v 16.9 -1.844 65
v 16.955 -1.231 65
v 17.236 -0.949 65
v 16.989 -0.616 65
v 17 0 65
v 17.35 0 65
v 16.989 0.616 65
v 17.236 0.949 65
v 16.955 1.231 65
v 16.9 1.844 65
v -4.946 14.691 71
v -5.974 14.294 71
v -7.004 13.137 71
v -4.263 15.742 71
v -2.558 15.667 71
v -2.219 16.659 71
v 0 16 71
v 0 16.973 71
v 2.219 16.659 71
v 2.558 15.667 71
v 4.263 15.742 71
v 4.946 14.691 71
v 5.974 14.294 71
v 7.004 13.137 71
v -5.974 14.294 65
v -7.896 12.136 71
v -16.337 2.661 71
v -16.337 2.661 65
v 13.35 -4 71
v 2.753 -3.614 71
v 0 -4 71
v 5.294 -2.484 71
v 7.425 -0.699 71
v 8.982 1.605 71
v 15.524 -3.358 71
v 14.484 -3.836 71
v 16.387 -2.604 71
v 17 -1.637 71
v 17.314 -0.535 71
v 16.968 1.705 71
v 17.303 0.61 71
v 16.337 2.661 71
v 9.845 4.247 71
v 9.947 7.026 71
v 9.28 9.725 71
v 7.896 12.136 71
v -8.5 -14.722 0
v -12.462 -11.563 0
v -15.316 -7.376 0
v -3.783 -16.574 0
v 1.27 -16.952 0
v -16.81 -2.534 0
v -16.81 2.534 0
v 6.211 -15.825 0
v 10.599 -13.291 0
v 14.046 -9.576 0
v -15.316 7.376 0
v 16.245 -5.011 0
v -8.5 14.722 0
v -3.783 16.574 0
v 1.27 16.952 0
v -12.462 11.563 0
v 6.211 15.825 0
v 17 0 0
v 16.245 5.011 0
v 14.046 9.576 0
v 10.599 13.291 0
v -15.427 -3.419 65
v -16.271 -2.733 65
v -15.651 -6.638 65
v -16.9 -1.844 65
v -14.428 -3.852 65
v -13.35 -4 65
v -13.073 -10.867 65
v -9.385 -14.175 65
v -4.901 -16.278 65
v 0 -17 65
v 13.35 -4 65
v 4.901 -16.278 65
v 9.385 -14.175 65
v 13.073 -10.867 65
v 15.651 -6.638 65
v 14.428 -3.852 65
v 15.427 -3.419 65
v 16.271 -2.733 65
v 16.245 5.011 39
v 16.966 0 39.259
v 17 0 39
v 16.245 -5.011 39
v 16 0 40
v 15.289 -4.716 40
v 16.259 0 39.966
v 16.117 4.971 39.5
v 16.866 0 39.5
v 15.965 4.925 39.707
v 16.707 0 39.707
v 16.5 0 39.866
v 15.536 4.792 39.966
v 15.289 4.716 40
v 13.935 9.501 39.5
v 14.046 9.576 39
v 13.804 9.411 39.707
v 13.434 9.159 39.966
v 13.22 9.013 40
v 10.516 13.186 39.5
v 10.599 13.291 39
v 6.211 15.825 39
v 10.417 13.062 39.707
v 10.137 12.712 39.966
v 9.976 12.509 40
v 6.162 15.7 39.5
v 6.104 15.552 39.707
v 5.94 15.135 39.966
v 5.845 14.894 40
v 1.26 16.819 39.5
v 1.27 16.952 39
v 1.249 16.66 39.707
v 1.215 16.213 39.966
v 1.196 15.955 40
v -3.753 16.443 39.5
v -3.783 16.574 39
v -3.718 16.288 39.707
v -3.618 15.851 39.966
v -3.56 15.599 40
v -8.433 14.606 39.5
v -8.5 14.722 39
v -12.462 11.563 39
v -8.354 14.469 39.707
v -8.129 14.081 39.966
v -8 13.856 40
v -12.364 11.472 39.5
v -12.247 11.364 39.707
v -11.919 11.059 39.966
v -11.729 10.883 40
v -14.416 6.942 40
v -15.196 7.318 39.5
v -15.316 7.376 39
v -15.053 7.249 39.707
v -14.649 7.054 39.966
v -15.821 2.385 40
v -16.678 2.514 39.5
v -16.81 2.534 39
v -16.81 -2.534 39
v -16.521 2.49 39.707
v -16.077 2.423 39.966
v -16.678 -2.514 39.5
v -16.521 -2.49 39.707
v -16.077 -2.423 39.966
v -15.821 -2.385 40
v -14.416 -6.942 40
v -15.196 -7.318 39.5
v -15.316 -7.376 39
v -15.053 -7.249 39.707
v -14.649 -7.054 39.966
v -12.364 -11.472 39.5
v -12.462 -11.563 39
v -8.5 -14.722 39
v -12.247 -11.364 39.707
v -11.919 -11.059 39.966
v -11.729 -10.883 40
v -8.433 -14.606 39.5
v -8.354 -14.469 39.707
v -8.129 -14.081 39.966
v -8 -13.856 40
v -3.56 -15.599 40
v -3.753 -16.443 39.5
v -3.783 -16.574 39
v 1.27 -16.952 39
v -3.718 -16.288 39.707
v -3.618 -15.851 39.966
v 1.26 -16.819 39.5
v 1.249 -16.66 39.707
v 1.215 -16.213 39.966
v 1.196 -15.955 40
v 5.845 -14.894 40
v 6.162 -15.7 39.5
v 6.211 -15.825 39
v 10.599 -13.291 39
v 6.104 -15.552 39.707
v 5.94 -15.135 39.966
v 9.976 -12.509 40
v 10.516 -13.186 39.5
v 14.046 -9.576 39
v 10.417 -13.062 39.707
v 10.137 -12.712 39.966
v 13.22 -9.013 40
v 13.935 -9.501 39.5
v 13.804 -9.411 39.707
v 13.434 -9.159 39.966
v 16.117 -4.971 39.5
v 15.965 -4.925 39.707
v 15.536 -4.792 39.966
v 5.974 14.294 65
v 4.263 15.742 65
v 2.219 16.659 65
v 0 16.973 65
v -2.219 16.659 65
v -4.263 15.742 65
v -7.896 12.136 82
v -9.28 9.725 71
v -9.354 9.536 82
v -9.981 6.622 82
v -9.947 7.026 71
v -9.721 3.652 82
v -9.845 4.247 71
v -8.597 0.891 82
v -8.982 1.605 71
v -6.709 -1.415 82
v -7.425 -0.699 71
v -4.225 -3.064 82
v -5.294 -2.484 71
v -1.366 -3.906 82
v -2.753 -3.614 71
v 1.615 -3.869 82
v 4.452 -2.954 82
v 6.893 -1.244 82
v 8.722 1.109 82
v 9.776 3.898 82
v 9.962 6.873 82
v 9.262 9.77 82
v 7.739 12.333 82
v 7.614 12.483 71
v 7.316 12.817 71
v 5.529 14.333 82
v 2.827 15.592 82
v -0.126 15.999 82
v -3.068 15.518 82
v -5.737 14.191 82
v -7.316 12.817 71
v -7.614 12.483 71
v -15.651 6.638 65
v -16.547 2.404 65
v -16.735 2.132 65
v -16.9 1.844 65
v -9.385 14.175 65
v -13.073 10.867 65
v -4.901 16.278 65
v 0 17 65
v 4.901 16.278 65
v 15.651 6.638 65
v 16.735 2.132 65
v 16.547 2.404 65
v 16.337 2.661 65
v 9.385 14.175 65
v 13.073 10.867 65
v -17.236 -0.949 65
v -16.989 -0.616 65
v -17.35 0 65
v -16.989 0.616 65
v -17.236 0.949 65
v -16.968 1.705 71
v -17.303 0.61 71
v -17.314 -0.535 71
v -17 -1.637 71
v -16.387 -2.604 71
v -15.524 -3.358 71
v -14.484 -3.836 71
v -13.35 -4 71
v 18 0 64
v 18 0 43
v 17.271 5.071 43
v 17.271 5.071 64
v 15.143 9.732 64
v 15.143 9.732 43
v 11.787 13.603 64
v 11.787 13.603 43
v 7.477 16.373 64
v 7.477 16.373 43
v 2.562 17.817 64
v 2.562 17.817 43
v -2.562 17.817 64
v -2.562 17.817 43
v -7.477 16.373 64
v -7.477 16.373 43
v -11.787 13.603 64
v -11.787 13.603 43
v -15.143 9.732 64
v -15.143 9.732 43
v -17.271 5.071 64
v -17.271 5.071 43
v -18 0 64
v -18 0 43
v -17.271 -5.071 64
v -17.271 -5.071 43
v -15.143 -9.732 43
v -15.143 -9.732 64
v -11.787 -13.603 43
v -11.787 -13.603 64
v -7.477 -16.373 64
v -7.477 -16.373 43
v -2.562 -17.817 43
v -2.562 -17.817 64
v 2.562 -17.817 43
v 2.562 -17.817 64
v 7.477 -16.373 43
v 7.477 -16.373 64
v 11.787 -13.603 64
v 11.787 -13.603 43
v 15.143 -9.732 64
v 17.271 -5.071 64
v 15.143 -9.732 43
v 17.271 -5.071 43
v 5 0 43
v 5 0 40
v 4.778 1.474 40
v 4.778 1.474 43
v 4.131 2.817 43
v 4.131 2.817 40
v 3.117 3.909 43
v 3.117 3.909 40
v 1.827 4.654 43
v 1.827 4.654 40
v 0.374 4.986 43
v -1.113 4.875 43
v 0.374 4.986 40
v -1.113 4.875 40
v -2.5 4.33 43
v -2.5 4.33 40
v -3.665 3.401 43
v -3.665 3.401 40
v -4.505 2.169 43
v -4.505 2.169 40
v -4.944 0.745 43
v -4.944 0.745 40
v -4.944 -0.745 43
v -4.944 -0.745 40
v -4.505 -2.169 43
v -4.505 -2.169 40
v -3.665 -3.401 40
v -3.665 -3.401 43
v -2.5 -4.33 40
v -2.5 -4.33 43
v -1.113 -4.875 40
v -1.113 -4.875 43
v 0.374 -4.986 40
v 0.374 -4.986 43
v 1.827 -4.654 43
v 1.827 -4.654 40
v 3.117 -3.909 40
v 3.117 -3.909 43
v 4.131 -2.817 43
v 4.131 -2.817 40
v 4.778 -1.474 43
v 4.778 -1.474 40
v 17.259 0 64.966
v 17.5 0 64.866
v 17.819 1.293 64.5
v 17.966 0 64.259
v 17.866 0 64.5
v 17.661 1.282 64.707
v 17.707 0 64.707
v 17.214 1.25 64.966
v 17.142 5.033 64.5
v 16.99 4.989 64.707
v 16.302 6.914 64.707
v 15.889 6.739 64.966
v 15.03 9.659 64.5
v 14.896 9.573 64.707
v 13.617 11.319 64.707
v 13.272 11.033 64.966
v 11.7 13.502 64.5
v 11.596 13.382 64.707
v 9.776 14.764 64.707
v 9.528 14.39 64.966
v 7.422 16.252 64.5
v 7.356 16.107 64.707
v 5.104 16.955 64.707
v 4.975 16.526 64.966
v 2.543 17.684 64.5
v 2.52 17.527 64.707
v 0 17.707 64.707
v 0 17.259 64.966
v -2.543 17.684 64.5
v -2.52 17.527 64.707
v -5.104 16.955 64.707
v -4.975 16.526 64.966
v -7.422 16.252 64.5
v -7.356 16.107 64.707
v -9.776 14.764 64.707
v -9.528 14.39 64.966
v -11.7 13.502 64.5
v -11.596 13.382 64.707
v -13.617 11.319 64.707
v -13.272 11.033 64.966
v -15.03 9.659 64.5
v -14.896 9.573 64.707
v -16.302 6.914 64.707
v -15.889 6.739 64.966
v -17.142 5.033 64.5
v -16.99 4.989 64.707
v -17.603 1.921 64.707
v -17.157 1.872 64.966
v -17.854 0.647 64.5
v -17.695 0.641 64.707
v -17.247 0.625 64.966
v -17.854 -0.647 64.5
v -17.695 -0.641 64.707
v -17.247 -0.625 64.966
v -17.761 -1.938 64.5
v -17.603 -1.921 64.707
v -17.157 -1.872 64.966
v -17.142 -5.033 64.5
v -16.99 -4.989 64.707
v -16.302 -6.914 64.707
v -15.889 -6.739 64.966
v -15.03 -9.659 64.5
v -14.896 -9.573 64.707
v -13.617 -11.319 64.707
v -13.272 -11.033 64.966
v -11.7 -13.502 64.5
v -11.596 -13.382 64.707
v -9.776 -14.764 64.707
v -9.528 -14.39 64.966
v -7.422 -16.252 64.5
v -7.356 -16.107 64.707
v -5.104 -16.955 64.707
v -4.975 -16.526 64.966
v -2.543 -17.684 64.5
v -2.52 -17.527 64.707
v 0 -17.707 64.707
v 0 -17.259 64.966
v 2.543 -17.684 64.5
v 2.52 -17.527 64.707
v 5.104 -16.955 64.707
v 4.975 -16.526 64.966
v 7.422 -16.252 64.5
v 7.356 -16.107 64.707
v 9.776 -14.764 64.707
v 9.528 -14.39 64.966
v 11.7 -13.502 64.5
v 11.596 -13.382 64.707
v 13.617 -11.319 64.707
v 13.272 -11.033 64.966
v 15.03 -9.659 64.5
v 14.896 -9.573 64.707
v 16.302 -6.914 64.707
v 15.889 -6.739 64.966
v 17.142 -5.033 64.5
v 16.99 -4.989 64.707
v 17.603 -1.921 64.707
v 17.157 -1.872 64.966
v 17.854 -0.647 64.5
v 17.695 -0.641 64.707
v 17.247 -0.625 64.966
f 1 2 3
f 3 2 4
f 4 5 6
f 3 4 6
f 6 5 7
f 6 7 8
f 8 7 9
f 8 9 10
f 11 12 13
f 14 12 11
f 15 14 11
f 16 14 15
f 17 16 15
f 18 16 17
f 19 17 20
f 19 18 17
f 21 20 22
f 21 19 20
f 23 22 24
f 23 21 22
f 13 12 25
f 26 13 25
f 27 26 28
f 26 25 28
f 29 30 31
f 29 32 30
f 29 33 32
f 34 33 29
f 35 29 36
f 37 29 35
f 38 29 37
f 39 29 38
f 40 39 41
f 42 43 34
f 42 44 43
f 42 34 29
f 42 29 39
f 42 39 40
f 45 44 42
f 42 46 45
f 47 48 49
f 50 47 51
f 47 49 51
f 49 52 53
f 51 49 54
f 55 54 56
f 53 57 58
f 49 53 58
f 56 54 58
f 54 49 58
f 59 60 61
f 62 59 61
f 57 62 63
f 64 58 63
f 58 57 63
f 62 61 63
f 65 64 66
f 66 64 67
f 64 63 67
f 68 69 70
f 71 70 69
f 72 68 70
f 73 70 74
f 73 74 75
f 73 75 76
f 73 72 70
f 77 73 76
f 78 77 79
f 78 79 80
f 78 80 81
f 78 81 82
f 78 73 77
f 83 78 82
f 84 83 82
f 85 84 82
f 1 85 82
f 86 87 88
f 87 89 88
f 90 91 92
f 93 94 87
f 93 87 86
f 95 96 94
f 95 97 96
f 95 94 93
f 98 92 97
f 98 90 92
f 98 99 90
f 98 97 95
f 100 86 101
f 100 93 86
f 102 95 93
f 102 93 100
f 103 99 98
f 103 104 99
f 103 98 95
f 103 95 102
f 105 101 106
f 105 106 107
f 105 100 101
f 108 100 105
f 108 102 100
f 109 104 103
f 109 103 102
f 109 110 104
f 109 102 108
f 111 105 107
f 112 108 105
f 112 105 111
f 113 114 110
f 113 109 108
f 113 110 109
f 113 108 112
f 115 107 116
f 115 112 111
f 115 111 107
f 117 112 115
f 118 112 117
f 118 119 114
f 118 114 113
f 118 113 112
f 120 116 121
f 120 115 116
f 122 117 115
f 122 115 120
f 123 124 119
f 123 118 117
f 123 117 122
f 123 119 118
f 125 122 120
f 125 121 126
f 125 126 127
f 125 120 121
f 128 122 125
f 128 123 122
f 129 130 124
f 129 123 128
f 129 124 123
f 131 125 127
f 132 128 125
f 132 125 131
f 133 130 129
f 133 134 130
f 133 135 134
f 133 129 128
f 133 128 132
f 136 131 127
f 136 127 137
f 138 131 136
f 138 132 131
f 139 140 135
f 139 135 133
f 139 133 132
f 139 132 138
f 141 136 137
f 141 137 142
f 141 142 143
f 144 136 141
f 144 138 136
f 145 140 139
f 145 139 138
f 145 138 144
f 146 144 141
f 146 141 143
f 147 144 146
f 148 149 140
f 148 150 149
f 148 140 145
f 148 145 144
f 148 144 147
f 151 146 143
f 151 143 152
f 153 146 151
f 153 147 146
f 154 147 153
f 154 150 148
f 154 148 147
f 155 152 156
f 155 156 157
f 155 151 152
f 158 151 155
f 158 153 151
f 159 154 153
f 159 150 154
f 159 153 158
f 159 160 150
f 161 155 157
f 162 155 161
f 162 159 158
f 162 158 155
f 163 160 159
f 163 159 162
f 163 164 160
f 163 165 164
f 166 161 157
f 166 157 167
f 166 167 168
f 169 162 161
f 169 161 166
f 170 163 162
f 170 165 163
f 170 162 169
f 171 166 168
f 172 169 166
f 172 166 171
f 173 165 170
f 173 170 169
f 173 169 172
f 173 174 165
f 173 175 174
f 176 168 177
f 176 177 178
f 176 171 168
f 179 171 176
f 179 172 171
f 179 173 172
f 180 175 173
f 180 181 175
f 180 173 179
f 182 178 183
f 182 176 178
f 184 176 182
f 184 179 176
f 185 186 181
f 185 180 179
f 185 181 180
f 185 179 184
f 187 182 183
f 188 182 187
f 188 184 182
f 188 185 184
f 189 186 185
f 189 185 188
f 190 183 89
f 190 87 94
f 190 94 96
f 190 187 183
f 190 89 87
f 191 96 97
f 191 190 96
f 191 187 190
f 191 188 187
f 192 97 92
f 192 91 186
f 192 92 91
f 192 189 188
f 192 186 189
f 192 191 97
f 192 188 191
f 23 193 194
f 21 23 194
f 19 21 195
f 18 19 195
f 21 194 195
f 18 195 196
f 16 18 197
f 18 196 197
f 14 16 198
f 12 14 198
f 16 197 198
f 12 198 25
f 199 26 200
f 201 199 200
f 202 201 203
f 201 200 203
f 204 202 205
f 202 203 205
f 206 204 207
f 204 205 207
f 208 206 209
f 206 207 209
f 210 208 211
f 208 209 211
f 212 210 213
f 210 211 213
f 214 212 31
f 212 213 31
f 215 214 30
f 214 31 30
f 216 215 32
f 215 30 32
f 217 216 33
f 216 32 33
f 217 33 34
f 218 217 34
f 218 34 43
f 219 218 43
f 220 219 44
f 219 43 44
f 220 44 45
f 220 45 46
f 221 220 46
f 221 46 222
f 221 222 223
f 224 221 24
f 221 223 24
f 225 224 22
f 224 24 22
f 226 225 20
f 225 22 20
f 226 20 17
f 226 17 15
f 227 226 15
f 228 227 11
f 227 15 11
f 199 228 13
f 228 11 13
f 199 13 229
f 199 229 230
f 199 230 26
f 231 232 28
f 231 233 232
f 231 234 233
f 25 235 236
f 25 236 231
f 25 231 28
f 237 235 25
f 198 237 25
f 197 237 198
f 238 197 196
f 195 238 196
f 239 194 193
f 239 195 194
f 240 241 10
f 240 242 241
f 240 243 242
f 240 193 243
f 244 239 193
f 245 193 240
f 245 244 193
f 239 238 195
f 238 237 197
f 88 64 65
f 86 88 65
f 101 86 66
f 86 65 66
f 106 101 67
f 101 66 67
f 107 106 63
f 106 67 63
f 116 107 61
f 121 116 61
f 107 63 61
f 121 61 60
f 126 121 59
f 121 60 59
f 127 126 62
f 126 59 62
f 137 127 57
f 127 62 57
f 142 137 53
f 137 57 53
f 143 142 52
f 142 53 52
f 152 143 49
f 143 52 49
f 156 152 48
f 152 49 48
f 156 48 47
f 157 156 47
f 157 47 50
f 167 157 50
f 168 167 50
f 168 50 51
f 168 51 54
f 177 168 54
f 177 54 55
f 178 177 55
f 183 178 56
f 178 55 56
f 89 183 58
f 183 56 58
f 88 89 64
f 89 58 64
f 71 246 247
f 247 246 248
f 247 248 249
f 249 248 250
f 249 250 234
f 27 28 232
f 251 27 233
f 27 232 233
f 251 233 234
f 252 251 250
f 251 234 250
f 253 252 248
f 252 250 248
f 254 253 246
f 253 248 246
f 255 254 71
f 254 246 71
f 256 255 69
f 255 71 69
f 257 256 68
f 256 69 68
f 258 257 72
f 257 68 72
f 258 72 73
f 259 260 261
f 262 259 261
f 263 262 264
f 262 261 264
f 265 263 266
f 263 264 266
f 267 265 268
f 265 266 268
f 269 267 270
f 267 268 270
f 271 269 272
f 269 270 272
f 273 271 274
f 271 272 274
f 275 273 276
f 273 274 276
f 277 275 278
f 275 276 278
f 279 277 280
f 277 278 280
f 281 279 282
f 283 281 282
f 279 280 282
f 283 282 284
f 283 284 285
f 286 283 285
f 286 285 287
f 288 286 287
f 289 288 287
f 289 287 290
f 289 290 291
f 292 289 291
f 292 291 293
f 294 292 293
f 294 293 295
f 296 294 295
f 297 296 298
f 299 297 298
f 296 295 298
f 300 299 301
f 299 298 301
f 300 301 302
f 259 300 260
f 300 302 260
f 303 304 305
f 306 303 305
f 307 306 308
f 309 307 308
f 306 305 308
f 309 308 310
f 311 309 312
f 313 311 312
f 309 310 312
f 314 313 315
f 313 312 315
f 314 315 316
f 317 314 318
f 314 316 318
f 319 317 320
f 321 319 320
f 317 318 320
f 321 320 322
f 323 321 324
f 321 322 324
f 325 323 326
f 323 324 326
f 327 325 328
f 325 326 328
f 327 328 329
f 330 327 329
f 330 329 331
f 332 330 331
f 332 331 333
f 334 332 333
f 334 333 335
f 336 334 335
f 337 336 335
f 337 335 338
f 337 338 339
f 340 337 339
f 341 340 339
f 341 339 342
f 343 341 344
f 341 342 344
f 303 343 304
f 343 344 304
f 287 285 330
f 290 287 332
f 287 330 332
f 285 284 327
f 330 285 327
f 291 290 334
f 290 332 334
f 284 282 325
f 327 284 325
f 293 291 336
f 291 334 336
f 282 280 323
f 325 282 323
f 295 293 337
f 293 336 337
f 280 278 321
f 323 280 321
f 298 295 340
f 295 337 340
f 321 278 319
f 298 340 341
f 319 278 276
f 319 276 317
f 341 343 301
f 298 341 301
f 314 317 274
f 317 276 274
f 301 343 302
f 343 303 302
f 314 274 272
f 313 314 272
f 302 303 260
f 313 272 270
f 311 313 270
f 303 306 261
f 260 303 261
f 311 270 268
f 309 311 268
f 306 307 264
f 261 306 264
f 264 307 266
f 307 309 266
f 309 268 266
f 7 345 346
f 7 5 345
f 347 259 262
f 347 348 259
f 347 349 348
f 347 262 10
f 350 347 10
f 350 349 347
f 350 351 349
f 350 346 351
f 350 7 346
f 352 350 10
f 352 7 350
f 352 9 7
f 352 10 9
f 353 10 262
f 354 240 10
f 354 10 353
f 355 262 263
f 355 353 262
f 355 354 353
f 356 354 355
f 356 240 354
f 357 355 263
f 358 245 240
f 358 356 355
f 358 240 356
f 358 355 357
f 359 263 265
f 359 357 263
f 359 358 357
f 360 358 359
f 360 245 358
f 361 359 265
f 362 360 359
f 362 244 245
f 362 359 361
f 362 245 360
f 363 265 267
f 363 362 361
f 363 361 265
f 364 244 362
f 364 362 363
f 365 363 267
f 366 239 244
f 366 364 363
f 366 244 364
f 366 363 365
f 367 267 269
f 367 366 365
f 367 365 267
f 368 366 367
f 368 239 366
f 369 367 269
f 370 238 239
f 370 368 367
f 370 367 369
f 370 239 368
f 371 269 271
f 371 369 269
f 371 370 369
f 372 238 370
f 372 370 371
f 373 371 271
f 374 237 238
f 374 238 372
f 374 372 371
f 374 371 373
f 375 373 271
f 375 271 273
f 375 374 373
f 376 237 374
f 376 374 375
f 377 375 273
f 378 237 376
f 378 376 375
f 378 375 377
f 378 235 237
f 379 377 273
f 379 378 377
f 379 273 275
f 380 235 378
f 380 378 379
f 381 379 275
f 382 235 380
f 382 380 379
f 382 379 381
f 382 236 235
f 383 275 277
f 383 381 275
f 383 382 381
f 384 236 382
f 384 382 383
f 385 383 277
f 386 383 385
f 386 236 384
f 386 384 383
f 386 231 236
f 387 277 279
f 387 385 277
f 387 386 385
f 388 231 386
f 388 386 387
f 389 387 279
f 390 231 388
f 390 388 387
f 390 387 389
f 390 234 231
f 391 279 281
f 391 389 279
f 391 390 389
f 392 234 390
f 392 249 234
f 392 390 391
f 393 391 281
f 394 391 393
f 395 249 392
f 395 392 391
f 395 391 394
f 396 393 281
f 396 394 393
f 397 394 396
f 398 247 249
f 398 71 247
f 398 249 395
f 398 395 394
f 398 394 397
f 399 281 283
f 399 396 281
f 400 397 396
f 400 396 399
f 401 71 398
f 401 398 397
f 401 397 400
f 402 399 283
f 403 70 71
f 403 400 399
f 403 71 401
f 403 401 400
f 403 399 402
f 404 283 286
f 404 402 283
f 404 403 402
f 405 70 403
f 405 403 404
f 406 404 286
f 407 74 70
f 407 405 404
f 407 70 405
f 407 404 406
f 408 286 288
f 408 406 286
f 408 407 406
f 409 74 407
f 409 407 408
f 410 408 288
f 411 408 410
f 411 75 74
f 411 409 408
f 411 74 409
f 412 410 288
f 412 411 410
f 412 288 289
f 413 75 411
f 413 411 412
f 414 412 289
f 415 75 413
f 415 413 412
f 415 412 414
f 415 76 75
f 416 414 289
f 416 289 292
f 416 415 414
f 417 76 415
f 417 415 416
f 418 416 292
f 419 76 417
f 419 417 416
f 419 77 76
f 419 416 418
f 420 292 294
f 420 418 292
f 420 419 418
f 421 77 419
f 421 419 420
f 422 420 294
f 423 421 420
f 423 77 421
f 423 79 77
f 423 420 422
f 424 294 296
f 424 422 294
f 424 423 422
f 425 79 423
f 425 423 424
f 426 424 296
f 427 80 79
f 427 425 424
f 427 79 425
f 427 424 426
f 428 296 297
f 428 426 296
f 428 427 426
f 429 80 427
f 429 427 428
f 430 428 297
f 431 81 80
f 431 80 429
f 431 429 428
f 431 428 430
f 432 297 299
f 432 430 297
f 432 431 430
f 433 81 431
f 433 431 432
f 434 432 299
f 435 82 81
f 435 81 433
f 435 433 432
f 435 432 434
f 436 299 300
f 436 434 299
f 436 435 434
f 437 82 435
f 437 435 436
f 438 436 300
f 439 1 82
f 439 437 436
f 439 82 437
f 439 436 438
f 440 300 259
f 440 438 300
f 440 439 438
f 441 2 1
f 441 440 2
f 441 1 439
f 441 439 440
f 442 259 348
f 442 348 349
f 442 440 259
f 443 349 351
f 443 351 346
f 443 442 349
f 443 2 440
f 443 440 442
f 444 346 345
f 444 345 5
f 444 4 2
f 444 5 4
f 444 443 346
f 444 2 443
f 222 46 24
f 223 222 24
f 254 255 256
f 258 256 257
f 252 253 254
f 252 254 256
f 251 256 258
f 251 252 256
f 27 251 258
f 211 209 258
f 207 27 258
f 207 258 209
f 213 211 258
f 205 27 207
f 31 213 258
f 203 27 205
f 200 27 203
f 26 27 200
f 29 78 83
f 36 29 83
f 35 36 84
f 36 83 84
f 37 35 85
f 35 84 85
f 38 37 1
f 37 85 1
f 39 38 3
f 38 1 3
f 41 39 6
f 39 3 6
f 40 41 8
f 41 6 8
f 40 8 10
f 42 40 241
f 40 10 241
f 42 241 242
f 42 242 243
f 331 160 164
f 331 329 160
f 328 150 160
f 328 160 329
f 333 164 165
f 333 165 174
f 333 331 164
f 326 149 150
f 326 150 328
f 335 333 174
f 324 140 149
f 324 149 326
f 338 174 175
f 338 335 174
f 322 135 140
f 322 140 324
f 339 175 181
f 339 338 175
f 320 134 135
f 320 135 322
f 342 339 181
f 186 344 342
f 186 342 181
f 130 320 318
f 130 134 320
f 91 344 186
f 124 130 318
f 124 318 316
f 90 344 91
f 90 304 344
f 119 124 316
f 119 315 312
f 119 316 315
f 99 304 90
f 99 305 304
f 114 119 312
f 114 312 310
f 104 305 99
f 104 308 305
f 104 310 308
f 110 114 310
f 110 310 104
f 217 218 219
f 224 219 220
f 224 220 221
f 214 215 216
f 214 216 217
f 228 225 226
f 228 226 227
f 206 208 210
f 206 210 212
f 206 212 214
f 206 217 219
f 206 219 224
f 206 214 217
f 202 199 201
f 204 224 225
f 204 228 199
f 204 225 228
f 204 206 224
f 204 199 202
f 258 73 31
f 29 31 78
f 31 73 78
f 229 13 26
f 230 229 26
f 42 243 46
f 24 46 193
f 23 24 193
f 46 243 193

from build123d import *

# Parameters (mm, degrees)
ESQUISSE1_R        = 17
BOSS_EXTRU_1_DEPTH = 40
ESQUISSE2_R        = 5
BOSS_EXTRU_2_DEPTH = 3
CONG_1_R           = 1
ESQUISSE3_R        = 18
BOSS_EXTRU_3_DEPTH = 22
CONG_2_R           = 1
BOSS_EXTRU_4_DEPTH = 6
ESQUISSE5_R        = 10
BOSS_EXTRU_5_DEPTH = 11


with BuildPart() as part:
    # Esquisse1 → Boss.-Extru.1 (new body)
    with BuildSketch(Plane.XY):
        Circle(ESQUISSE1_R)
    extrude(amount=BOSS_EXTRU_1_DEPTH)

    # Esquisse2 → Boss.-Extru.2 (add)
    with BuildSketch(Plane.XY.offset(40)):
        Circle(ESQUISSE2_R)
    extrude(amount=BOSS_EXTRU_2_DEPTH)

    # Congé1
    cong_1_edges = [part.edges().sort_by_distance(p)[0] for p in [
        (-17, 0, 40),
    ]]
    fillet(cong_1_edges, radius=CONG_1_R)

    # Esquisse3 → Boss.-Extru.3 (add)
    with BuildSketch(Plane.XY.offset(43)):
        Circle(ESQUISSE3_R)
    extrude(amount=BOSS_EXTRU_3_DEPTH)

    # Congé2
    cong_2_edges = [part.edges().sort_by_distance(p)[0] for p in [
        (-18, 0, 65),
    ]]
    fillet(cong_2_edges, radius=CONG_2_R)

    # Esquisse4 → Boss.-Extru.4 (add)
    with BuildSketch(Plane.XY.offset(65)):
        with BuildLine():
            Line((-13.350159933, -4), (13.350159933, -4))
            ThreePointArc((13.350159933, -4), (17, -1.636663523), (16.336939985, 2.660666256))
            Line((16.336939985, 2.660666256), (5.973560103, 14.294269767))
            ThreePointArc((5.973560103, 14.294269767), (0, 16.972937256), (-5.973560103, 14.294269767))
            Line((-5.973560103, 14.294269767), (-16.336939985, 2.660666256))
            ThreePointArc((-16.336939985, 2.660666256), (-17, -1.636663523), (-13.350159933, -4))
        make_face()
    extrude(amount=BOSS_EXTRU_4_DEPTH)

    # Esquisse5 → Boss.-Extru.5 (add)
    with BuildSketch(Plane.XY.offset(71)):
        with Locations(Location((0, 6, 0), (0, 0, 142.149265436))):
            Circle(ESQUISSE5_R)
    extrude(amount=BOSS_EXTRU_5_DEPTH)


solid = part.part
